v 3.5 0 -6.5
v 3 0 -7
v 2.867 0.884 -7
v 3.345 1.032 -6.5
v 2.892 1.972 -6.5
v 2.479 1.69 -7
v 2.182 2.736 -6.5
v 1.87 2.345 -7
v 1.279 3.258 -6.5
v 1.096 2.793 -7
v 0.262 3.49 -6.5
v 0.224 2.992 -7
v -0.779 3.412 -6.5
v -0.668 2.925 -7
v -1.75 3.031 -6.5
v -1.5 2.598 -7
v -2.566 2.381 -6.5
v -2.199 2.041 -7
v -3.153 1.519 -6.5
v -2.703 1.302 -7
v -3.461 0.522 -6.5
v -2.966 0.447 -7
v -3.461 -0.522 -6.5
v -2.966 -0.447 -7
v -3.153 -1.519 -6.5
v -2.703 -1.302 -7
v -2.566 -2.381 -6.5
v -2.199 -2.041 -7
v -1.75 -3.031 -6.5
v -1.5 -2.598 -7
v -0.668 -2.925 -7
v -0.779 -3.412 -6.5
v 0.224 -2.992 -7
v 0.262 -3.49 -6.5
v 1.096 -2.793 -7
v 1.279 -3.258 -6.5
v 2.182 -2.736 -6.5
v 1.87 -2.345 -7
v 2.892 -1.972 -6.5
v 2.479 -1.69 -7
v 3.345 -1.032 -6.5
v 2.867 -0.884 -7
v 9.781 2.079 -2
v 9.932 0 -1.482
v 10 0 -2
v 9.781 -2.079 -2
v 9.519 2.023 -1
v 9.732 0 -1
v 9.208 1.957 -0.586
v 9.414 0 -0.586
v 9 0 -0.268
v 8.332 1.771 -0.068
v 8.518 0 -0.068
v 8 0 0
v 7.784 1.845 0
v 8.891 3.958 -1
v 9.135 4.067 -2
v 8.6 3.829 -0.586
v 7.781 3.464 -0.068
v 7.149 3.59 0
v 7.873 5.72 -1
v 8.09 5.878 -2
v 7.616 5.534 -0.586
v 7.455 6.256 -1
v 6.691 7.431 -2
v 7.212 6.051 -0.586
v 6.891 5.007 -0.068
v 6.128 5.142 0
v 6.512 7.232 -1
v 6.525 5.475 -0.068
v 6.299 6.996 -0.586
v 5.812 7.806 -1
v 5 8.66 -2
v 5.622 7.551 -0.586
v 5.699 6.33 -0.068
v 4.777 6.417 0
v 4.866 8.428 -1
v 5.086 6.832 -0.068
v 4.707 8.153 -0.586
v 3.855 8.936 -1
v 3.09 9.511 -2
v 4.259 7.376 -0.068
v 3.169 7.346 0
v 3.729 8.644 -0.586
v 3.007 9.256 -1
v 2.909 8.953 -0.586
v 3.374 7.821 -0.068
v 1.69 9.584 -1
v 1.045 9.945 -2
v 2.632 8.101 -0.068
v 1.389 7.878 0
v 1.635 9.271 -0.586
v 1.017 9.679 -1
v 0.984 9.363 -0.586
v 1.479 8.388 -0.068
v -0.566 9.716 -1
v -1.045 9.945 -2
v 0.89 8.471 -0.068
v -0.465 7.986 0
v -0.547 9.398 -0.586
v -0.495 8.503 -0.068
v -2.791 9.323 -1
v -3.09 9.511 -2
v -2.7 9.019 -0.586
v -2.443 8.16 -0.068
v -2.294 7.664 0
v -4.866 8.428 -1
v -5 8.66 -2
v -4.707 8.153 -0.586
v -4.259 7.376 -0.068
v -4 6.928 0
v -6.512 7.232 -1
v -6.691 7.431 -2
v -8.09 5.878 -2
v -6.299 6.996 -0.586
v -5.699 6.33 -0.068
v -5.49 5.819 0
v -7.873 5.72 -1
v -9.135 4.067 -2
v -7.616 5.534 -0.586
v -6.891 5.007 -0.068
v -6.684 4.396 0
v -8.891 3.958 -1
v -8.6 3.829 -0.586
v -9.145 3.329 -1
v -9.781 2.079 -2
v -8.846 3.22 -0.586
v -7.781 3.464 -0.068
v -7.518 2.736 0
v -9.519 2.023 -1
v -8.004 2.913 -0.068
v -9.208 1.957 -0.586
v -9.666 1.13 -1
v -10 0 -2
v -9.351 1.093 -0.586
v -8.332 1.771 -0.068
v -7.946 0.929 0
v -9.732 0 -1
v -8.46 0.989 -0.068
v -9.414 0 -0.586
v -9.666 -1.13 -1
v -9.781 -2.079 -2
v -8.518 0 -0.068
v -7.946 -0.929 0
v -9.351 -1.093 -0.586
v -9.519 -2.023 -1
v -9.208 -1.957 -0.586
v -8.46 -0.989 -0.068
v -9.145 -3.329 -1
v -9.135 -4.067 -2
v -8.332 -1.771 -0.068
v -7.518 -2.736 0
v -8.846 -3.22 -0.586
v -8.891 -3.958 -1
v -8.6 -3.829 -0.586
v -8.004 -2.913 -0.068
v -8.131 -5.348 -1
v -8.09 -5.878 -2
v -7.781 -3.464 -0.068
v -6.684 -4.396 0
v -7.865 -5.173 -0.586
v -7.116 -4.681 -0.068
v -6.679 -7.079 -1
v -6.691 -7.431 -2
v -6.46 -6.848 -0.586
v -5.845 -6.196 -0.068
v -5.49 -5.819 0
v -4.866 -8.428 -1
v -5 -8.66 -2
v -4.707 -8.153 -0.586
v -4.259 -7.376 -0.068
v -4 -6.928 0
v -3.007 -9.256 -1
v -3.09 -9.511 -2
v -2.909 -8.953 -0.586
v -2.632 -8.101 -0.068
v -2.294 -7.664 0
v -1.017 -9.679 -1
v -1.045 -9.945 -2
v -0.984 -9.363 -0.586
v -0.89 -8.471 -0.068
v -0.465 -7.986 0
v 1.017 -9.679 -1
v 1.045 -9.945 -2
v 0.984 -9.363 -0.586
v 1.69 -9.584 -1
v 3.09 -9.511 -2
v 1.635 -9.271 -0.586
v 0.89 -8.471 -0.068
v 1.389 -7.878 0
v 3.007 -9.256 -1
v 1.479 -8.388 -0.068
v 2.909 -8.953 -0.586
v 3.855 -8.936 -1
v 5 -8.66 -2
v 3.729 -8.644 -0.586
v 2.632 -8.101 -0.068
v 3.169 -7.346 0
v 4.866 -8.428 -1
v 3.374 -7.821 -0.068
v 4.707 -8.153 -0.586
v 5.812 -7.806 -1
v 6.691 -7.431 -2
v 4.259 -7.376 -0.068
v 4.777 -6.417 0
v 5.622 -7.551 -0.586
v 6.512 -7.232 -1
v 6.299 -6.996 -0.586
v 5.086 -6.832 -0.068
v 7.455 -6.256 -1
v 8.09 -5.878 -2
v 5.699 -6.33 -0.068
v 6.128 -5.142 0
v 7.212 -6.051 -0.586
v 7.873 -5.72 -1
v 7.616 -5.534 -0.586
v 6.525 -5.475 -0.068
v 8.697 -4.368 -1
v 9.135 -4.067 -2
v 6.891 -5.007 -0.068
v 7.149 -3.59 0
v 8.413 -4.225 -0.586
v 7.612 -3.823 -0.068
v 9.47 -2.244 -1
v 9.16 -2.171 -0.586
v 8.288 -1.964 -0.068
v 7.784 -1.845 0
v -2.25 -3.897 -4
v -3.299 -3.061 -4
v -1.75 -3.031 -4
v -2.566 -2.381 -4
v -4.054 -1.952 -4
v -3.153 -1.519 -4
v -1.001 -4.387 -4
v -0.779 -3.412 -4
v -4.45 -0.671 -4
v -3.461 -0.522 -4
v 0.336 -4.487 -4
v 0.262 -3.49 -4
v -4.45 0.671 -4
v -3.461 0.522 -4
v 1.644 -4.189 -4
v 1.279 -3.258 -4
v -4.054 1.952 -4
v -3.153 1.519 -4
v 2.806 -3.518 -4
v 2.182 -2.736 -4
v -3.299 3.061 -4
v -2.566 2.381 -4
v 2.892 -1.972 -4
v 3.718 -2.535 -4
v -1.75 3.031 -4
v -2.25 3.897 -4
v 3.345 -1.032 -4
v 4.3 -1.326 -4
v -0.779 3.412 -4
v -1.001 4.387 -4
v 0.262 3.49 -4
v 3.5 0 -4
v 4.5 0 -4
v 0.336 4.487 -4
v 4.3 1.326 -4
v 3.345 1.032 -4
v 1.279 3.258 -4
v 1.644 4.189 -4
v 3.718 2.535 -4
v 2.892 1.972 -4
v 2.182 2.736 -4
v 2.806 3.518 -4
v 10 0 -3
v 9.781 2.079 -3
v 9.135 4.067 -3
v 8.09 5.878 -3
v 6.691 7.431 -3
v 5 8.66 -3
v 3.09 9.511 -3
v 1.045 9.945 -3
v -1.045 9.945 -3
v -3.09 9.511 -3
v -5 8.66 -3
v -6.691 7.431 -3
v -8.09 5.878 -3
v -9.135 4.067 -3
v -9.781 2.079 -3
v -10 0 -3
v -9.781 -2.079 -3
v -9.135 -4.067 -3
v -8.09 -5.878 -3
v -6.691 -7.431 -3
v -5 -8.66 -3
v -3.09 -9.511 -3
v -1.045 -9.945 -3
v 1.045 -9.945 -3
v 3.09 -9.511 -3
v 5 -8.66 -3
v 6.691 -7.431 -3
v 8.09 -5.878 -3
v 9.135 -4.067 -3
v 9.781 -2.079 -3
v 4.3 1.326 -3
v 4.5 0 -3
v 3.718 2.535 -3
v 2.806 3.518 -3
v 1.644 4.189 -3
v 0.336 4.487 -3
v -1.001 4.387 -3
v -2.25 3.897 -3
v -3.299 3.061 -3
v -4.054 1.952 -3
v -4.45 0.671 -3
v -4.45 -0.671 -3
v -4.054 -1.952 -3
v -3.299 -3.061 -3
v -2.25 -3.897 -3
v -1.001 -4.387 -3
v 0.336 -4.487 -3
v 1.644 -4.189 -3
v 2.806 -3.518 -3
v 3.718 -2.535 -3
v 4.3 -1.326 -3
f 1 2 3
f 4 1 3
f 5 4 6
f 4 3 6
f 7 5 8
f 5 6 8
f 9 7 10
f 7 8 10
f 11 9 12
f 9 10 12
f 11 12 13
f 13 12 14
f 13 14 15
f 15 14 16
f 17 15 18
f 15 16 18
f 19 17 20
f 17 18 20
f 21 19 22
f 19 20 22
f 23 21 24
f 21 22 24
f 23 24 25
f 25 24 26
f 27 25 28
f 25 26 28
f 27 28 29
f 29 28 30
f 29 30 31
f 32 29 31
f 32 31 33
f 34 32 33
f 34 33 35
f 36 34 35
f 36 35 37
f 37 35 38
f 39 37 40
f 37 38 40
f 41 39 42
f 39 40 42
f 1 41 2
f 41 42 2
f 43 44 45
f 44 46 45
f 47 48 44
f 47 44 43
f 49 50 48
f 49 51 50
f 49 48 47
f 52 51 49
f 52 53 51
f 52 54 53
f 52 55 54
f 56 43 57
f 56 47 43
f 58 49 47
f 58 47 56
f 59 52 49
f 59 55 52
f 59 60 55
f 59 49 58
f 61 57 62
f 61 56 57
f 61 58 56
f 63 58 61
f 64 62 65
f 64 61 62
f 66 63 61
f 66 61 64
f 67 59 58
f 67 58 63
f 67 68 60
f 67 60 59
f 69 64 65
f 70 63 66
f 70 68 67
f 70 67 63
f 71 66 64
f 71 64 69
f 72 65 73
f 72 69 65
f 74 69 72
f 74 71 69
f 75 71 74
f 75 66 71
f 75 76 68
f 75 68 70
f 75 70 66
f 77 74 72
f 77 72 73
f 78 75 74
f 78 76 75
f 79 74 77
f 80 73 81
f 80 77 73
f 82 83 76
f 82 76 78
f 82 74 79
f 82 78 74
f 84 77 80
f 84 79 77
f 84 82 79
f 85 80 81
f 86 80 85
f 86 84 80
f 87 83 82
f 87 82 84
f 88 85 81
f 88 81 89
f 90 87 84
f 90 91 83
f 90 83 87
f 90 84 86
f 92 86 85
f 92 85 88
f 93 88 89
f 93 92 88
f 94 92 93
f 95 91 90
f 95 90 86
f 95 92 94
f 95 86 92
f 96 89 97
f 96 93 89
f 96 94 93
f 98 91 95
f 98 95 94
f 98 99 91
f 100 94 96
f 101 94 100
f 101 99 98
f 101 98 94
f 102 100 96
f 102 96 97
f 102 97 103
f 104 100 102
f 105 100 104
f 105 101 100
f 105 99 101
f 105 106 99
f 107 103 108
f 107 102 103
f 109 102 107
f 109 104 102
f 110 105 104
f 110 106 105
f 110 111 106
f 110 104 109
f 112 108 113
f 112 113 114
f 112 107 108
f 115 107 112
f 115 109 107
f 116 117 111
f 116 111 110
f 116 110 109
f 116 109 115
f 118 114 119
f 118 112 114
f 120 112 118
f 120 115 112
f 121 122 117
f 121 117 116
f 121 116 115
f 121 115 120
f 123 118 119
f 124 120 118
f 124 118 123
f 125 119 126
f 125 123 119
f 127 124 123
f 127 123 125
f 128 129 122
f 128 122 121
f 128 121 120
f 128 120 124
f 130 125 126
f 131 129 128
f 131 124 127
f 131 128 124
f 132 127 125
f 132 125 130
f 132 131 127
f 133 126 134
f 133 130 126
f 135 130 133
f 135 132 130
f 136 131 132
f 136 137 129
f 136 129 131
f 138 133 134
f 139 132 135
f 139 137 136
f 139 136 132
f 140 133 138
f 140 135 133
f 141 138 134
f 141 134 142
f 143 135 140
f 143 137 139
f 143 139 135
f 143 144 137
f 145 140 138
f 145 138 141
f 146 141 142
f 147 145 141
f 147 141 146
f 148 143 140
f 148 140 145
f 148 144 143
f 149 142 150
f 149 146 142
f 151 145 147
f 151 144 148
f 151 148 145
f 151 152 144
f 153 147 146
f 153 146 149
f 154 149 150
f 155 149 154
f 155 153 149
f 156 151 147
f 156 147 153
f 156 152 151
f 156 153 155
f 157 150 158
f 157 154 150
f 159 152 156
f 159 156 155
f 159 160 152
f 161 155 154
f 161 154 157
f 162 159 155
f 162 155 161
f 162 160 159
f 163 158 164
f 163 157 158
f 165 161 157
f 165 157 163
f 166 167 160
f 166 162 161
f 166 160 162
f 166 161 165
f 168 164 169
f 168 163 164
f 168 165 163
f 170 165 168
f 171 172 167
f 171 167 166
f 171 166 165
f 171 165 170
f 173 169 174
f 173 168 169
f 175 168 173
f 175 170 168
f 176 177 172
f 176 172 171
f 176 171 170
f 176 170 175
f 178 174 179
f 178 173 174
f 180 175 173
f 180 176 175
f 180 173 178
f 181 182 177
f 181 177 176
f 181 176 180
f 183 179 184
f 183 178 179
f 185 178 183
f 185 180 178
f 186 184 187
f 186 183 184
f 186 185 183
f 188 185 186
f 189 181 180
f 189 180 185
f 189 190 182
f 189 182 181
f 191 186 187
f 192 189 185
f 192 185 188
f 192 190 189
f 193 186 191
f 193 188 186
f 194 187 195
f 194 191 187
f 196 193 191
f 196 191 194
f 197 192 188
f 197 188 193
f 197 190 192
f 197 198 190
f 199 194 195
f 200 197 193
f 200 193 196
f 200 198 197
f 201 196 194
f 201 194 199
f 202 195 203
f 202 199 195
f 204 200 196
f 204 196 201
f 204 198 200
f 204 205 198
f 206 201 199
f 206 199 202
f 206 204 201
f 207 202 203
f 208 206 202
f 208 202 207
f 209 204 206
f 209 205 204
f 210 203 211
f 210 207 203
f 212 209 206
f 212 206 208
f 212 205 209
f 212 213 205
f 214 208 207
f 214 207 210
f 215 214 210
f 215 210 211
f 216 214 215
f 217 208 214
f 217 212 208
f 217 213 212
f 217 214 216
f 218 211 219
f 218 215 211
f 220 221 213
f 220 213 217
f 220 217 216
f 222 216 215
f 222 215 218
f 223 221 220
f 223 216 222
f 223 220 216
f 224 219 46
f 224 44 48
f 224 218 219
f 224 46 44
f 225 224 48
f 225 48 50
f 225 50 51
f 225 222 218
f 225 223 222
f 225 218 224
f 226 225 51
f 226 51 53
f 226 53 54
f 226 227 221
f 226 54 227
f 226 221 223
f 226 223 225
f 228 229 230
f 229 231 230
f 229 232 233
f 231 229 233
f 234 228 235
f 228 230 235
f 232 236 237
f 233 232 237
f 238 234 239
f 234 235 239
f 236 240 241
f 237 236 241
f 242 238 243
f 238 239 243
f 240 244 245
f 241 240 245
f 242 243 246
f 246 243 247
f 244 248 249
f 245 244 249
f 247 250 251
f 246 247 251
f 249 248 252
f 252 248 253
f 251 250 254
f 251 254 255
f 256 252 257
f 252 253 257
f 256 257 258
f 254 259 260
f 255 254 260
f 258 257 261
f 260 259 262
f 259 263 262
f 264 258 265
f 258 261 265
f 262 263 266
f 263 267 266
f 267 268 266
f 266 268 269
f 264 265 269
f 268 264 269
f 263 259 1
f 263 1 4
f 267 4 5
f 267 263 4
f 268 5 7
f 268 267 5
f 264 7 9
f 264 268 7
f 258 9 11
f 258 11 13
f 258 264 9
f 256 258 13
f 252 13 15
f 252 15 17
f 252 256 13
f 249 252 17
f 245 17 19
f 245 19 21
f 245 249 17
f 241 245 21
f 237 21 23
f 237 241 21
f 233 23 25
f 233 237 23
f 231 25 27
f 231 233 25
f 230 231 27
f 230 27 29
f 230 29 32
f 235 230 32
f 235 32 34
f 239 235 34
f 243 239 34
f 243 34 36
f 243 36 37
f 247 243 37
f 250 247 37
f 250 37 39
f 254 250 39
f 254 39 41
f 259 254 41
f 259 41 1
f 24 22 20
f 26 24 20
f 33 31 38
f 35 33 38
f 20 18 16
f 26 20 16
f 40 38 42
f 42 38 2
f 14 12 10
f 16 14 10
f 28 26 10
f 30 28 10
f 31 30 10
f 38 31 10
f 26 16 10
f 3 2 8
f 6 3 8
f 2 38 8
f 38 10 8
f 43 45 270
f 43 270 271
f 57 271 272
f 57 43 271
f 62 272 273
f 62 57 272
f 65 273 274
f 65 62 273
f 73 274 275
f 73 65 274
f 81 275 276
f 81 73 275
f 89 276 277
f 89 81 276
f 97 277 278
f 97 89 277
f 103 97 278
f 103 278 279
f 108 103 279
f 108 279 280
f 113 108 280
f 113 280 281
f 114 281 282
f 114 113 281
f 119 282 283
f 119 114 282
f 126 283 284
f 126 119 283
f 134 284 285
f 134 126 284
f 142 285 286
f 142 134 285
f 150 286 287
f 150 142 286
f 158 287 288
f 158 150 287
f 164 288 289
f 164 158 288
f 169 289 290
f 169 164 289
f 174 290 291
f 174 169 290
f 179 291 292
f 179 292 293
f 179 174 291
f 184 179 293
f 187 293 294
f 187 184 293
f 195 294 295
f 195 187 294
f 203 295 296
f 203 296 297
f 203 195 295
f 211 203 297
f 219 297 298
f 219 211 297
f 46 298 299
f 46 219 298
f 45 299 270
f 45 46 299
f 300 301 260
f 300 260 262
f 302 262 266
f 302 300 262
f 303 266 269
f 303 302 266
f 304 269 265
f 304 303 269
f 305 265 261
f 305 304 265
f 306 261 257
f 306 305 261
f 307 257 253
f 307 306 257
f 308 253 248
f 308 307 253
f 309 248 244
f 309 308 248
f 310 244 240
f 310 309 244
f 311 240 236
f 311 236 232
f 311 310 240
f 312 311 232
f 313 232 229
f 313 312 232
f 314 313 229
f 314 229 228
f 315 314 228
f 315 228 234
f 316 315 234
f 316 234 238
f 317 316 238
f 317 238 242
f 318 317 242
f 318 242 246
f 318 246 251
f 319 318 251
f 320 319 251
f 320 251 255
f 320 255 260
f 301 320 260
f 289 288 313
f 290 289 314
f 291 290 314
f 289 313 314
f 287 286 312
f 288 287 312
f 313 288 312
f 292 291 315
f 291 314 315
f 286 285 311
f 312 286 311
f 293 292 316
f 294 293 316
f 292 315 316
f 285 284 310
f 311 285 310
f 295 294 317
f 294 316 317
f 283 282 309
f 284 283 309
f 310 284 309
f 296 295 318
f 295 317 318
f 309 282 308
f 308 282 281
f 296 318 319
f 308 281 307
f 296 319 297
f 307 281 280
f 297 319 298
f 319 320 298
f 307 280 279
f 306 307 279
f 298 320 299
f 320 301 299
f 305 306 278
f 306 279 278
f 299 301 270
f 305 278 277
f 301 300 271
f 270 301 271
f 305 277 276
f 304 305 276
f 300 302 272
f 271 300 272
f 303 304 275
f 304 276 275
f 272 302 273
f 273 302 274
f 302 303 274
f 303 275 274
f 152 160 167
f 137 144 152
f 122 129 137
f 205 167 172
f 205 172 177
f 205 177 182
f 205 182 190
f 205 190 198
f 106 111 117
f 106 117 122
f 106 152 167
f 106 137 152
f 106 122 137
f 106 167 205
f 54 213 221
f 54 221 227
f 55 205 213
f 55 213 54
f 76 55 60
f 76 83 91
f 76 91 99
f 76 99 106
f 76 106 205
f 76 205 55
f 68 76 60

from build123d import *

# Parameters (mm, degrees)
F0_R     = 3.5
F1_DEPTH = 7
F0_R_2   = 4.5
F2_DEPTH = 4
F0_R_3   = 10
F3_DEPTH = 3
F4_R     = 2
F5_SIZE  = 0.5


with BuildPart() as f1:
    # F0 (on Top) → F1 (new body)
    with BuildSketch(Plane.XY):
        Circle(F0_R)
    extrude(amount=-F1_DEPTH)

    # F0 (on Top) → F2 (join)
    with BuildSketch(Plane.XY):
        Circle(F0_R_2)
        Circle(F0_R, mode=Mode.SUBTRACT)
    extrude(amount=-F2_DEPTH)

    # F0 (on Top) → F3 (join)
    with BuildSketch(Plane.XY):
        Circle(F0_R_3)
        Circle(F0_R_2, mode=Mode.SUBTRACT)
    extrude(amount=-F3_DEPTH)

    # F4
    f4_edges = [f1.edges().sort_by_distance(p)[0] for p in [
        (-10, 0, 0),
    ]]
    fillet(f4_edges, radius=F4_R)

    # F5
    f5_edges = [f1.edges().sort_by_distance(p)[0] for p in [
        (-3.5, 0, -7),
    ]]
    chamfer(f5_edges, length=F5_SIZE)


solid = f1.part
